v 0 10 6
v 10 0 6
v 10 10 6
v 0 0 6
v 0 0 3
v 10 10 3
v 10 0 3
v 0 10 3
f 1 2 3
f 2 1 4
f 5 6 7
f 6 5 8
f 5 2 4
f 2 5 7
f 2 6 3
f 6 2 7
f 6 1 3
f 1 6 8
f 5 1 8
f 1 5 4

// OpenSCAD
size = 10;
height = 3;
//color("red")cube([size,size,height]);
color("blue")translate([0,0,height])cube([size,size,height]);
